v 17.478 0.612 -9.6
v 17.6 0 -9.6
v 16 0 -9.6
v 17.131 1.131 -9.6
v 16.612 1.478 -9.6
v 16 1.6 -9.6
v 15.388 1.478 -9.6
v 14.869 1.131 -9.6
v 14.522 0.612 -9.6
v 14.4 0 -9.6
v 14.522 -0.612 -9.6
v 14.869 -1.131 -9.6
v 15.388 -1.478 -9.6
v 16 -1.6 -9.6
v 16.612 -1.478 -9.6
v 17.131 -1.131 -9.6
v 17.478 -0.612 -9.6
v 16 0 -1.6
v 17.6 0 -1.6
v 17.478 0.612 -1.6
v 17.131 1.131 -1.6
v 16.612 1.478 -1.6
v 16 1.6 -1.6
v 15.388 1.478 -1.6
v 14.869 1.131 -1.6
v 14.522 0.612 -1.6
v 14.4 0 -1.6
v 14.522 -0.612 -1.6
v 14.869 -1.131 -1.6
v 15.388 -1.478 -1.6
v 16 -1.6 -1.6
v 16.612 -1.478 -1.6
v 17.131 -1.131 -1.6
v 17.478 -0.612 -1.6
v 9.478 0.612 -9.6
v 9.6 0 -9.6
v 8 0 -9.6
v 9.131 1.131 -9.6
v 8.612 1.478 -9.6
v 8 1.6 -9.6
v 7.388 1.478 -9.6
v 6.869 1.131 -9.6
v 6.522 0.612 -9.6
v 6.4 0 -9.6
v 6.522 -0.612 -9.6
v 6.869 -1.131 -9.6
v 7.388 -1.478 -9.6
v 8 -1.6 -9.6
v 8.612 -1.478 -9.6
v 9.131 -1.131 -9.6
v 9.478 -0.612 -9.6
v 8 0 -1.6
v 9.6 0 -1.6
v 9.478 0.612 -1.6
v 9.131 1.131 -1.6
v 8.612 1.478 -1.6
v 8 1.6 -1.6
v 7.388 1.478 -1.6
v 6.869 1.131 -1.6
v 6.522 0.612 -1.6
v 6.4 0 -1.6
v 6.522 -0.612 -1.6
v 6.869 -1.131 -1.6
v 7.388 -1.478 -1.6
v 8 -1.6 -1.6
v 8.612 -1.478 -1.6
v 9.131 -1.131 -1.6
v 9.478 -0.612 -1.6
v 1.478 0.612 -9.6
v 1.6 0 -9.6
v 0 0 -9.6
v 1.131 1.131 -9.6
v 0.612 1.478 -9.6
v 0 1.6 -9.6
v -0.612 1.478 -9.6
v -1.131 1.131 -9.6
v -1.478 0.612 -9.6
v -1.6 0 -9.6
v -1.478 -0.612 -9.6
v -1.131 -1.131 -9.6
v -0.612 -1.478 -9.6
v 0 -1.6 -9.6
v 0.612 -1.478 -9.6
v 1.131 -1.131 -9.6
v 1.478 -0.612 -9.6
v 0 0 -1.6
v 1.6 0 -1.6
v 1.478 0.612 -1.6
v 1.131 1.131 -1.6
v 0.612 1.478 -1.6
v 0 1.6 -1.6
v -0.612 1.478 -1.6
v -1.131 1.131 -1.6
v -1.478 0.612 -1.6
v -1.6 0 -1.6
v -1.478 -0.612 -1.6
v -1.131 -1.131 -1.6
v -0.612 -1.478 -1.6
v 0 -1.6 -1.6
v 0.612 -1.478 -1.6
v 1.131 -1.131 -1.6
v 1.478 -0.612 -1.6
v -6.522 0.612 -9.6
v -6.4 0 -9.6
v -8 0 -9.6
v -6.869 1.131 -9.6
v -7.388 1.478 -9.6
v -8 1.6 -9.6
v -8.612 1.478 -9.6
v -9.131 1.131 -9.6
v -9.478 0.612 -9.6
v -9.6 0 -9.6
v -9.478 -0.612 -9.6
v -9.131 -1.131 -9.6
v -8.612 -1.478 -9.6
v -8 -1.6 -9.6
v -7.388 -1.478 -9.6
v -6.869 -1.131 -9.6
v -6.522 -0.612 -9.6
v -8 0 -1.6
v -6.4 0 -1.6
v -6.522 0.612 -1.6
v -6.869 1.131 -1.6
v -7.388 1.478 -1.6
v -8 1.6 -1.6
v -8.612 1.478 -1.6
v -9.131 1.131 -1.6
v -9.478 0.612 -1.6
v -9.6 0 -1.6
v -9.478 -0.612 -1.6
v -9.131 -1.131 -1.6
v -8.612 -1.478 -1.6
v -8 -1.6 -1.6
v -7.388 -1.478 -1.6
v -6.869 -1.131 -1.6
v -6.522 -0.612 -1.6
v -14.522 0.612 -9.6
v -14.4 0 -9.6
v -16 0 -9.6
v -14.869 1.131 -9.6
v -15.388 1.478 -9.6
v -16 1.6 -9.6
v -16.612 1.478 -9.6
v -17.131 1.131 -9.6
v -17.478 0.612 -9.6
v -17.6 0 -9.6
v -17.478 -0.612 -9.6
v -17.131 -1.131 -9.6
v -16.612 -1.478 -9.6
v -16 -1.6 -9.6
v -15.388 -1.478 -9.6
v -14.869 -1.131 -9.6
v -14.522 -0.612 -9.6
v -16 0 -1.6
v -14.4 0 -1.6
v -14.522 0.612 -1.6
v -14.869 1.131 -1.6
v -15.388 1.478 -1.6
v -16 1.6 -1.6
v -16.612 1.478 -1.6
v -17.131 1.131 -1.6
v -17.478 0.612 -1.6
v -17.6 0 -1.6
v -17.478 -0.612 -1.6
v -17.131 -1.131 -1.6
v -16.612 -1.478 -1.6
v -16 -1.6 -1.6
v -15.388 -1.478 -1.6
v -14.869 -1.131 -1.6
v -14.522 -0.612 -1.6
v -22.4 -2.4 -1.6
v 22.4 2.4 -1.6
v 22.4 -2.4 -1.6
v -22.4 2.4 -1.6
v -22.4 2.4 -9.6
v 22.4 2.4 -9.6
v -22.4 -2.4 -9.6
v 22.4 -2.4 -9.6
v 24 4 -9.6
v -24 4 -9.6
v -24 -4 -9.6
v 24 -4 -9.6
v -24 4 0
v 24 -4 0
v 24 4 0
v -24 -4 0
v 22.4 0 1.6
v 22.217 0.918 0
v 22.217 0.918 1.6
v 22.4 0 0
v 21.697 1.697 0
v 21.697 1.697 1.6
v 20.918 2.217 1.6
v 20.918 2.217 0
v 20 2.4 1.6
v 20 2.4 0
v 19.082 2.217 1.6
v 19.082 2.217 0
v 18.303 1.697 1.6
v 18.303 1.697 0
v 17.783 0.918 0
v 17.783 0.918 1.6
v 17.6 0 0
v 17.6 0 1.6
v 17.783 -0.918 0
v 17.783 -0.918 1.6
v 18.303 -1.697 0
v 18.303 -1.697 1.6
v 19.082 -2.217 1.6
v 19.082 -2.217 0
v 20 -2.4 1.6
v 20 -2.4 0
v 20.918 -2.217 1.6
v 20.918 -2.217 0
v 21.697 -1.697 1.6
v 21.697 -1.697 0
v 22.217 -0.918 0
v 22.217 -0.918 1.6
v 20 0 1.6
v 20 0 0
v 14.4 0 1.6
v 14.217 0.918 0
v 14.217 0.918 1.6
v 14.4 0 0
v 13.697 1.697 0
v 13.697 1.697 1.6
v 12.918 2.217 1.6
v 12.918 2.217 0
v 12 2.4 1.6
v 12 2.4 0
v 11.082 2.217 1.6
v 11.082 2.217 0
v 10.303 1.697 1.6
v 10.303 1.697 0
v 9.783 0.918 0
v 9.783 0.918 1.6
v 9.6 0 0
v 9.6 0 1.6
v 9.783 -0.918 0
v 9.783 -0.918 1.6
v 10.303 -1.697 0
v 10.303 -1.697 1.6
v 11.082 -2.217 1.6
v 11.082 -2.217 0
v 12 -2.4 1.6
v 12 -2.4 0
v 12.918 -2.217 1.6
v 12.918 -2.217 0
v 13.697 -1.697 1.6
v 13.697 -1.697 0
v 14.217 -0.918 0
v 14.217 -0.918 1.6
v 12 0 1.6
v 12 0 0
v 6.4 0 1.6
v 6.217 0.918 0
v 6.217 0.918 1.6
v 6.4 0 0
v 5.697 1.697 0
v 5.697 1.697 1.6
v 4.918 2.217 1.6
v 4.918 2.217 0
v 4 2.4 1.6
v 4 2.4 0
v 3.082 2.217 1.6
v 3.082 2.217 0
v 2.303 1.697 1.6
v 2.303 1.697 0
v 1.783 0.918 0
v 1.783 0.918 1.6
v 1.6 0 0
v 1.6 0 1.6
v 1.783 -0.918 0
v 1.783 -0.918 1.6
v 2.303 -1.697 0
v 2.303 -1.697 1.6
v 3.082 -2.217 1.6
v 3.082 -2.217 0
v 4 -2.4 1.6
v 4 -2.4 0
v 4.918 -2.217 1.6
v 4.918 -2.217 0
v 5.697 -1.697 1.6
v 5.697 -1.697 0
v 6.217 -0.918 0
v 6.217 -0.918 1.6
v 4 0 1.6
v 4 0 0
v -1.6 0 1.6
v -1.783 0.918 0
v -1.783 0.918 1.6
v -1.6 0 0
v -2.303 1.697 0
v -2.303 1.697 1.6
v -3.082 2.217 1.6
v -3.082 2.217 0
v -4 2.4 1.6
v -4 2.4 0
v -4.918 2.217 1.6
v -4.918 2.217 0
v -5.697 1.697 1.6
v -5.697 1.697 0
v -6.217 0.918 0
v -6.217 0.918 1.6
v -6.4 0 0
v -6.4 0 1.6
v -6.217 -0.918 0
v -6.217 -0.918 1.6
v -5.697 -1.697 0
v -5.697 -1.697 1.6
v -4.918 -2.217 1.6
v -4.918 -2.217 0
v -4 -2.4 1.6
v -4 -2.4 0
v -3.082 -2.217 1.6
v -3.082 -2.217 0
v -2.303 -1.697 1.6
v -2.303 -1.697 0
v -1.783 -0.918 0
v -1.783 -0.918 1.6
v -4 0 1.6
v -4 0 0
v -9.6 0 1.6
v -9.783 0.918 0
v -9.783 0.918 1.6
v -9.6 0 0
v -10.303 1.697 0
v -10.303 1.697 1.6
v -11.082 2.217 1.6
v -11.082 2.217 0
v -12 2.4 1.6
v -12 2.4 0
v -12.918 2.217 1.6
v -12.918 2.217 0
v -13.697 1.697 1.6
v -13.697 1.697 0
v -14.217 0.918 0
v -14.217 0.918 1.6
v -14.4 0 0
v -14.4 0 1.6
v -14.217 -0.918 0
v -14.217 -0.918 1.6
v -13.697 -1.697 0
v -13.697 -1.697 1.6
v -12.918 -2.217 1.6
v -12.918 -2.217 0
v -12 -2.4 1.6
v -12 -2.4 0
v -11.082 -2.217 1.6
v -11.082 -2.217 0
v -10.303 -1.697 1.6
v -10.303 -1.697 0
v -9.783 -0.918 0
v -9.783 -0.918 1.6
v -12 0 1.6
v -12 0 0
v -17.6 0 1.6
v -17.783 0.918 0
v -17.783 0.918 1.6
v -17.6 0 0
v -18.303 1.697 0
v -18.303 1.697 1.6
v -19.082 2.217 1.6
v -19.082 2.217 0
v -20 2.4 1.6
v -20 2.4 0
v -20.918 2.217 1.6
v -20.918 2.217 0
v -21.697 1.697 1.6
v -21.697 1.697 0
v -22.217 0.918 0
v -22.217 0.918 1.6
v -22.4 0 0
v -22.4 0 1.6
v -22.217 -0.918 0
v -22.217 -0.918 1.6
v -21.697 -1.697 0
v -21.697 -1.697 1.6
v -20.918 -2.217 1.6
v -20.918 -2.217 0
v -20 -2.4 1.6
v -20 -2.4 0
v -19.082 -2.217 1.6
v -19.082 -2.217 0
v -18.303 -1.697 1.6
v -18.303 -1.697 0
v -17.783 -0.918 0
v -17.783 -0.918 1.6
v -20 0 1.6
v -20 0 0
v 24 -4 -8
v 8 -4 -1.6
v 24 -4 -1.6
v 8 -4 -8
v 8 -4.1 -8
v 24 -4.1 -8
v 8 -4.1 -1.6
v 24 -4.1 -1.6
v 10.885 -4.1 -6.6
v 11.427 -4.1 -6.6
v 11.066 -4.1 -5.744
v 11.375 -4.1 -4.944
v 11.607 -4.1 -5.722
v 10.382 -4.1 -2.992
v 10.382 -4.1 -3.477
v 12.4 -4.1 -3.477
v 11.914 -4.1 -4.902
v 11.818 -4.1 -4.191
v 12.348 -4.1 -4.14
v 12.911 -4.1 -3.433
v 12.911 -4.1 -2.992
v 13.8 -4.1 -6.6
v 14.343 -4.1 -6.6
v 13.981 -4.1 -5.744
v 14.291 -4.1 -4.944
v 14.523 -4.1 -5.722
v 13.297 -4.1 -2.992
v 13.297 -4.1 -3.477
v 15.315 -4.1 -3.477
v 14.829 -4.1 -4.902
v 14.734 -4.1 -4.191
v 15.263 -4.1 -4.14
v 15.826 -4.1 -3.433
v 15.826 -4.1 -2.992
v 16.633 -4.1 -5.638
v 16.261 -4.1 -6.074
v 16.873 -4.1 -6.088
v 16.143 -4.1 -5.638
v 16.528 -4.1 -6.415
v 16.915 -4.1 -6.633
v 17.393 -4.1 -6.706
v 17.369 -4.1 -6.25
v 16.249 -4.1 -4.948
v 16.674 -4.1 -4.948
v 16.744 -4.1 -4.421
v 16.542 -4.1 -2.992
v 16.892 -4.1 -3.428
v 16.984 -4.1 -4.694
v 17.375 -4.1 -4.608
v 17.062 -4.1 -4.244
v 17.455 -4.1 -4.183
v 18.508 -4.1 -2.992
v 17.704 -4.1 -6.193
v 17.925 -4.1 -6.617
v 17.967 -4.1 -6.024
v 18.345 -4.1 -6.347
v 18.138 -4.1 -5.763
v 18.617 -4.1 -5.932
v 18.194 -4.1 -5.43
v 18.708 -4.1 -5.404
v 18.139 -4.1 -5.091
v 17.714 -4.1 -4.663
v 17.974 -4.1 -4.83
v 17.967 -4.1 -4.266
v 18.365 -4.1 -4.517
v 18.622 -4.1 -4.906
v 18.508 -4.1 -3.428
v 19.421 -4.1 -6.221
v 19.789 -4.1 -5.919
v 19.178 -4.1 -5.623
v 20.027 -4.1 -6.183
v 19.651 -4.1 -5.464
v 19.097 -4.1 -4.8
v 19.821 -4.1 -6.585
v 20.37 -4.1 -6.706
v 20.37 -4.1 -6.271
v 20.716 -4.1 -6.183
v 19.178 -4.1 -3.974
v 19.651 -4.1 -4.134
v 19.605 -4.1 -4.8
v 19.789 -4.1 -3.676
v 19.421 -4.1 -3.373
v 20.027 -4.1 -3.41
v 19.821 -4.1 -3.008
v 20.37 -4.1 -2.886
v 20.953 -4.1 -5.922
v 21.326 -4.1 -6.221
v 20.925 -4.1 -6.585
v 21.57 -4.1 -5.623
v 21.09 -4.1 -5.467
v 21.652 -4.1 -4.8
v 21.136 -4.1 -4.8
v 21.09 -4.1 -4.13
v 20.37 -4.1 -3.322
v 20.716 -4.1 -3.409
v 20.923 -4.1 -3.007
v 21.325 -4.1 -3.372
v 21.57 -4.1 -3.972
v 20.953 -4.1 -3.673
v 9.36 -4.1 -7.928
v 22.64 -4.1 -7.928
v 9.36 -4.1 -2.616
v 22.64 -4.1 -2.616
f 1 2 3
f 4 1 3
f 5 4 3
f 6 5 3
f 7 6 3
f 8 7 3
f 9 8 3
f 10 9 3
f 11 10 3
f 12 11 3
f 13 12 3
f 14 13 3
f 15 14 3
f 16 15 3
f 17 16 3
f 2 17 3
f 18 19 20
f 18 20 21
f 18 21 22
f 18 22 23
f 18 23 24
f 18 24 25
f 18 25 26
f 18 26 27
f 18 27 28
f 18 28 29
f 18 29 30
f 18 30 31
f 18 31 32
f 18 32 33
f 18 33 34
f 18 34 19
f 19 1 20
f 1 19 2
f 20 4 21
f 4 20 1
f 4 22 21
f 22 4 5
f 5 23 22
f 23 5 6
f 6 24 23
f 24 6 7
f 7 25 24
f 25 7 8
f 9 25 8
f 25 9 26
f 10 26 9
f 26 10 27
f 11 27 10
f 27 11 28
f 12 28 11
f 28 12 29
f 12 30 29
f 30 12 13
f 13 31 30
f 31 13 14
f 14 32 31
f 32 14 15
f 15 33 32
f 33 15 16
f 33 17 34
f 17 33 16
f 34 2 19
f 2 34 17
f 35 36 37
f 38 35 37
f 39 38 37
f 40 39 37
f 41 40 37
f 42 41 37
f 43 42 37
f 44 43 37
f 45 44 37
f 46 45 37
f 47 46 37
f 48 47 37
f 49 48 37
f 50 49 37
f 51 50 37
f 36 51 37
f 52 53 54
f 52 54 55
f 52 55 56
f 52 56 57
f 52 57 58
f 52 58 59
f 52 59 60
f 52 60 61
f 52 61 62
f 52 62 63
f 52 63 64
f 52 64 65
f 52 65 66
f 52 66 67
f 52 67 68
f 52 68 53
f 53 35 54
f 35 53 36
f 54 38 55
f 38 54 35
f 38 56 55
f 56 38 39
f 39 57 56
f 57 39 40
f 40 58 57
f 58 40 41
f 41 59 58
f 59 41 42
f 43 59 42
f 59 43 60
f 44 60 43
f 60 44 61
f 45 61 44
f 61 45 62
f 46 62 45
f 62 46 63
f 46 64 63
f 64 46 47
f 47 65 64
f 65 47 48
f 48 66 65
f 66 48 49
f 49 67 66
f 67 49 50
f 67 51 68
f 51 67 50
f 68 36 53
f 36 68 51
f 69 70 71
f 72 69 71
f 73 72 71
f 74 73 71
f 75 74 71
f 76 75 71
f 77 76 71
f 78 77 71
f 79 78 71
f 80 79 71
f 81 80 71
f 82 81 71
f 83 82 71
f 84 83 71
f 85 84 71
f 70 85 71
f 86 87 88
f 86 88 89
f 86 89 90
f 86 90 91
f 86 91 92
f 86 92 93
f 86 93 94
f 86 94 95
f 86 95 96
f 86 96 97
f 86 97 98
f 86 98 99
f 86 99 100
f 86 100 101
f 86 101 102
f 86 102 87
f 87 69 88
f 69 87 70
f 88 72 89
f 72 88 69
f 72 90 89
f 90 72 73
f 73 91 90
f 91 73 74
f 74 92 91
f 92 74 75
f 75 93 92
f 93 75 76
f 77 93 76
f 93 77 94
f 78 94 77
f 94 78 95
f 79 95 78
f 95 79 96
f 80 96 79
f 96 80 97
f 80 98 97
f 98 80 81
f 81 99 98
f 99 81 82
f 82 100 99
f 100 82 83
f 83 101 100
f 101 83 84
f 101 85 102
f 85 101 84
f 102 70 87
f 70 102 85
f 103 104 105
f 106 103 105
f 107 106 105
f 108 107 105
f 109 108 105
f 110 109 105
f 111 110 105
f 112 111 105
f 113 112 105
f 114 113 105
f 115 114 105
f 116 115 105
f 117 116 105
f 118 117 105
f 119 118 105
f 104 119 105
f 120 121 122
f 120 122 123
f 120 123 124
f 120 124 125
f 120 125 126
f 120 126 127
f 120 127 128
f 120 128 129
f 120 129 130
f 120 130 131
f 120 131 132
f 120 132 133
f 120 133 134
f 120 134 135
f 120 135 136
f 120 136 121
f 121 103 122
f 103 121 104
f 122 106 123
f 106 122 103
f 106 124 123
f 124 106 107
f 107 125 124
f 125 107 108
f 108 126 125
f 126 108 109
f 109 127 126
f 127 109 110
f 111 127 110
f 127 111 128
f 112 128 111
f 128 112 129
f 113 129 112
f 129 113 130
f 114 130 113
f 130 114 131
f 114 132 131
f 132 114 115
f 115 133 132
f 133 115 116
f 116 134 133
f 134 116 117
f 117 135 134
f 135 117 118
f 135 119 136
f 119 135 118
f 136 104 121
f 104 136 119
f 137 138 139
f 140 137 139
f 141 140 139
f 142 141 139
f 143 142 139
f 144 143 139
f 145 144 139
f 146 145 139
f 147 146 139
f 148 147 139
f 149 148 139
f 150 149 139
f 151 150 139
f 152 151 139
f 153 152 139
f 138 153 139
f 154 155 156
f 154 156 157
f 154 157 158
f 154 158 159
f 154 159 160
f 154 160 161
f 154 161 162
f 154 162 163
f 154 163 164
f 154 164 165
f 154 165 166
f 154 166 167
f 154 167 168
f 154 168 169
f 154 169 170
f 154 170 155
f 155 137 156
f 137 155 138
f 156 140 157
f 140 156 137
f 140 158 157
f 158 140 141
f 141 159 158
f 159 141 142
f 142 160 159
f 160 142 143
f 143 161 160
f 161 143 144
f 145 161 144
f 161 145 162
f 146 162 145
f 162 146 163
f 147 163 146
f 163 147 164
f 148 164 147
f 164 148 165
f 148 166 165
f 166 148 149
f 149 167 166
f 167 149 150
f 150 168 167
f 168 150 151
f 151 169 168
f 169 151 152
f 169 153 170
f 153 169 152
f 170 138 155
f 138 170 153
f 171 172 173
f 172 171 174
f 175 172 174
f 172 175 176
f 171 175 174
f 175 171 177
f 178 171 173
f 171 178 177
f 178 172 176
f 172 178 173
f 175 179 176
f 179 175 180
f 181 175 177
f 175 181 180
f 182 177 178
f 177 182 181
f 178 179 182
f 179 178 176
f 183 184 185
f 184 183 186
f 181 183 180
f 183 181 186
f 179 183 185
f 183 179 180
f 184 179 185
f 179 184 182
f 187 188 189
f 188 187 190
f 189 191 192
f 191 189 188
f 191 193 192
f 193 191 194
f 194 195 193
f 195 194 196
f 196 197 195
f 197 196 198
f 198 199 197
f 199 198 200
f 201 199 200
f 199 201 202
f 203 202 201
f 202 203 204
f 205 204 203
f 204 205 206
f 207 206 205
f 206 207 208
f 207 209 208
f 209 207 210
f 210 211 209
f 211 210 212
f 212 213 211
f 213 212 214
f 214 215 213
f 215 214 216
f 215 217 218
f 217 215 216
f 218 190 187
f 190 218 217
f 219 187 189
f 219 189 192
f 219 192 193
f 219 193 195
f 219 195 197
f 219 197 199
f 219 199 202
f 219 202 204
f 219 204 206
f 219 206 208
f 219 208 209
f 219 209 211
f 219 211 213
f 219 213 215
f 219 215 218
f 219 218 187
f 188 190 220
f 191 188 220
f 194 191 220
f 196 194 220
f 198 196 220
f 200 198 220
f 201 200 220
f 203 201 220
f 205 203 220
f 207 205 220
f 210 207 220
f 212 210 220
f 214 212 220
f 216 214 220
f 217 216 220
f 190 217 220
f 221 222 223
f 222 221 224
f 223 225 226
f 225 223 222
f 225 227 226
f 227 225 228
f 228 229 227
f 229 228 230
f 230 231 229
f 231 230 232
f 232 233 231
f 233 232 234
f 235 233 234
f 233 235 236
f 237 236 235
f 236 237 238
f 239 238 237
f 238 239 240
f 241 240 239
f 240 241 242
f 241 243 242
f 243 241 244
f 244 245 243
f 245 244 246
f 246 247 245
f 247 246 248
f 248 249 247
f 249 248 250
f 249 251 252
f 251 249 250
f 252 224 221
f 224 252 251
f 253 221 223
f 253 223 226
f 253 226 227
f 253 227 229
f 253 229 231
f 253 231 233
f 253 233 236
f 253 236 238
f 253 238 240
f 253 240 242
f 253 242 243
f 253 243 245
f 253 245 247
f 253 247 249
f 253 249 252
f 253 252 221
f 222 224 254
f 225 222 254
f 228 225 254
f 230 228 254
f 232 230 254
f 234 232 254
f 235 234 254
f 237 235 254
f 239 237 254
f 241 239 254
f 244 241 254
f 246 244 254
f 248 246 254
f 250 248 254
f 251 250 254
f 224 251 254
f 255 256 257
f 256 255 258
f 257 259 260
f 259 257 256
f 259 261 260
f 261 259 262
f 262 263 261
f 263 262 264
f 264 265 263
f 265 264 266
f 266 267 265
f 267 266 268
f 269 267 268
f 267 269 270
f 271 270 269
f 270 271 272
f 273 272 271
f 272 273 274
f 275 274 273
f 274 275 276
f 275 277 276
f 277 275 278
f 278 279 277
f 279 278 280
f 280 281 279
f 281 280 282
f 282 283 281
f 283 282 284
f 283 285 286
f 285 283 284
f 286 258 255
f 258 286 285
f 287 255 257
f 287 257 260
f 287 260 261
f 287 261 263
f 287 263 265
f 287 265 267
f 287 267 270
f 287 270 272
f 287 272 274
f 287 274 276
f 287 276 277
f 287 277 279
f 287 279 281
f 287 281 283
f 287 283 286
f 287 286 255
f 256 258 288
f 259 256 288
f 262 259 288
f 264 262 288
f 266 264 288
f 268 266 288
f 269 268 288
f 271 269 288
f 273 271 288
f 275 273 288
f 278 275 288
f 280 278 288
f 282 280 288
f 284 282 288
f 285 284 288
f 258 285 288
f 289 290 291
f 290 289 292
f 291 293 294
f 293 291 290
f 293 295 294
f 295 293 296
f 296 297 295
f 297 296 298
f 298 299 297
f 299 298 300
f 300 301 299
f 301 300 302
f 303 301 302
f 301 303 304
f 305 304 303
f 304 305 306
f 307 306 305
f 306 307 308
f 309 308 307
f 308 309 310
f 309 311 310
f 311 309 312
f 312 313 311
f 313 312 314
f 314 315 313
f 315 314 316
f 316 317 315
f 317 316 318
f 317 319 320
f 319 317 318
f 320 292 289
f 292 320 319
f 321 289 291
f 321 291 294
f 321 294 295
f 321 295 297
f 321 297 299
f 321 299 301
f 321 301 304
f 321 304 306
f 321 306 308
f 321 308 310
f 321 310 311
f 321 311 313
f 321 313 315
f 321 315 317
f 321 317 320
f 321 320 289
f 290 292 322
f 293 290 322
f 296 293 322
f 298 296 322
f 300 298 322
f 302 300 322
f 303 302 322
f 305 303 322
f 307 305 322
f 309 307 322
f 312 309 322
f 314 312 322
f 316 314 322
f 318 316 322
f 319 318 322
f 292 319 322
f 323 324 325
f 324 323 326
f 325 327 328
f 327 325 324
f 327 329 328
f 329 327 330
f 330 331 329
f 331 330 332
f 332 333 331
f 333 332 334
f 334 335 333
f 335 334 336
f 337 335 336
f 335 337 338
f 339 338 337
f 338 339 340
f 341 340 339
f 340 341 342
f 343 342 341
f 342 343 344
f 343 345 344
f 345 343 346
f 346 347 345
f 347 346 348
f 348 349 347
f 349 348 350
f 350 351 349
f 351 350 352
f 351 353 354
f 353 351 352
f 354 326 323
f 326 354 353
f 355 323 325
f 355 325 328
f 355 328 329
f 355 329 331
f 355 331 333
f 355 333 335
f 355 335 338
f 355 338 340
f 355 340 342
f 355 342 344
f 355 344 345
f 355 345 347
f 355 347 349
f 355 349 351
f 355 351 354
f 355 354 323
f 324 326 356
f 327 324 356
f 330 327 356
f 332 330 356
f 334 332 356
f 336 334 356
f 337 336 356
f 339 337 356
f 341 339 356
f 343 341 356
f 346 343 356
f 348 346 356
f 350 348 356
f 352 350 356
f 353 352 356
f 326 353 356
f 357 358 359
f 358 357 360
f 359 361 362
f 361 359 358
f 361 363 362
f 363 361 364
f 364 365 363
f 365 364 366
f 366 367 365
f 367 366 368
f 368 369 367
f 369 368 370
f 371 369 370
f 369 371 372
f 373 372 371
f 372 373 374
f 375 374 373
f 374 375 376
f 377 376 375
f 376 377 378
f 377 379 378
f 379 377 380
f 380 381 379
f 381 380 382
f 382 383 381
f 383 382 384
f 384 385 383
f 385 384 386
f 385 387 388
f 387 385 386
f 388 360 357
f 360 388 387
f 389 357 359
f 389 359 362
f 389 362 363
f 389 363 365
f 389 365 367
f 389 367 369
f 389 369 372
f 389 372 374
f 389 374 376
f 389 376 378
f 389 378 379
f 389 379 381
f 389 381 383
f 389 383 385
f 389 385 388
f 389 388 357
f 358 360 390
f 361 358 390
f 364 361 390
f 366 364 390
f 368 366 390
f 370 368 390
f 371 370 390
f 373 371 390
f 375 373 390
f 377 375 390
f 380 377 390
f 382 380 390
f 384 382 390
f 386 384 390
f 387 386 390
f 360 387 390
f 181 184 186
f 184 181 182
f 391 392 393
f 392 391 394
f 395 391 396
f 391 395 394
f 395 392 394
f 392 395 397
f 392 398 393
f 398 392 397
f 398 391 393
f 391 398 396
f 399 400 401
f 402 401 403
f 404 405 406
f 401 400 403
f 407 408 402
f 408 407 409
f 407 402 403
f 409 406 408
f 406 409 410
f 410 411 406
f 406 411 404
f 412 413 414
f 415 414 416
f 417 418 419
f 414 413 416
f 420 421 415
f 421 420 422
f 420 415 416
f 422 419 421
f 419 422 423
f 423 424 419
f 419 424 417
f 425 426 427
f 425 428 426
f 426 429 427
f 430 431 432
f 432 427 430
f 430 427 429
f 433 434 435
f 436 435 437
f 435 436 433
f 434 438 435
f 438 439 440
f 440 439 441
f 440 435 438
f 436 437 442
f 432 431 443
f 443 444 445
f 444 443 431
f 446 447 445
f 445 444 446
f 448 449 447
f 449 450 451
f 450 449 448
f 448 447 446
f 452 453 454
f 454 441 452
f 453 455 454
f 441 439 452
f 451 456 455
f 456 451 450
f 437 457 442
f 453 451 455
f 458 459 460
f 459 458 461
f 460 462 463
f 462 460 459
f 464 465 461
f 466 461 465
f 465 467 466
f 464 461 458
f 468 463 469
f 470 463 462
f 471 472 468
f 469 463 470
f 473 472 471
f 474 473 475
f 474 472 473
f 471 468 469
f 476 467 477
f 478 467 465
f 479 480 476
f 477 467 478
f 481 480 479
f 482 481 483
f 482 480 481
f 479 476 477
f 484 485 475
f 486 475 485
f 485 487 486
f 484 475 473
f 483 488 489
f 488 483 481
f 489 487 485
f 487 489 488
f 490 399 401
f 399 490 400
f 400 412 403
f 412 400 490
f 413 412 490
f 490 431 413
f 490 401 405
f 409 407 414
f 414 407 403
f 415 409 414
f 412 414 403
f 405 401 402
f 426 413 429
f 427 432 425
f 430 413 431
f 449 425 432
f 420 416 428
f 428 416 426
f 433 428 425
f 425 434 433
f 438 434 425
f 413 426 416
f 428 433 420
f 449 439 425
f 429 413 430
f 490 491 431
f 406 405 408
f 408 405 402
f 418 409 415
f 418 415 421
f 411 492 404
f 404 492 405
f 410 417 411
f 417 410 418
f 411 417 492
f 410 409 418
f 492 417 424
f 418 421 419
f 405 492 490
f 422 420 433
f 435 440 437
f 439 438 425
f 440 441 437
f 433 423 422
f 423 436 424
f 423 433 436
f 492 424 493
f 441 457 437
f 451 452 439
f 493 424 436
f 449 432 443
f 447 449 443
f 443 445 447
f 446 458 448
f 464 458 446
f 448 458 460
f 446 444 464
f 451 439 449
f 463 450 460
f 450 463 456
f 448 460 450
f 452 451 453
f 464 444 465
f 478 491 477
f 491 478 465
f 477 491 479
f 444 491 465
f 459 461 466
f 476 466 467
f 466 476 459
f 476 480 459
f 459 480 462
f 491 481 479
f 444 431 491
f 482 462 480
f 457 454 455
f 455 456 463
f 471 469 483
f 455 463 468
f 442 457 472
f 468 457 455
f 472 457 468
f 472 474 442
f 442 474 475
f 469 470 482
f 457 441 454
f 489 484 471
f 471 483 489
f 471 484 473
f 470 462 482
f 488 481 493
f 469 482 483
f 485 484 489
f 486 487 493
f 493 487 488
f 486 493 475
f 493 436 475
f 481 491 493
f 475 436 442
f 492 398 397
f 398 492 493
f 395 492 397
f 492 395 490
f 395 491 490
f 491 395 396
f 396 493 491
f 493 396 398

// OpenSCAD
// file: ../p/4-4edge.scad
use <../lib.scad>
function ldraw_lib__4_4edge() = [
// 0 Circle 1.0
// 0 Name: 4-4edge.dat
// 0 Author: James Jessiman
// 0 !LDRAW_ORG Primitive UPDATE 2017-01
// 0 !LICENSE Licensed under CC BY 2.0 and CC BY 4.0 : see CAreadme.txt
// 
// 0 BFC CERTIFY CCW
  [0,"BFC","CERTIFY"],
  [0,"BFC","CCW"],
// 
// 0 !HISTORY 1998-12-15 [PTadmin] Official Update 1998-10
// 0 !HISTORY 2005-12-28 [PTadmin] Official Update 2005-01
// 0 !HISTORY 2007-06-24 [PTadmin] Header formatted for Contributor Agreement
// 0 !HISTORY 2008-07-01 [PTadmin] Official Update 2008-01
// 0 !HISTORY 2017-01-15 [Steffen] BFCed
// 0 !HISTORY 2017-12-30 [PTadmin] Official Update 2017-01
// 
// 
// 2 24 1 0 0 0.9239 0 0.3827
  [2,24,1,0,0,0.9239,0,0.3827],
// 2 24 0.9239 0 0.3827 0.7071 0 0.7071
  [2,24,0.9239,0,0.3827,0.7071,0,0.7071],
// 2 24 0.7071 0 0.7071 0.3827 0 0.9239
  [2,24,0.7071,0,0.7071,0.3827,0,0.9239],
// 2 24 0.3827 0 0.9239 0 0 1
  [2,24,0.3827,0,0.9239,0,0,1],
// 2 24 0 0 1 -0.3827 0 0.9239
  [2,24,0,0,1,-0.3827,0,0.9239],
// 2 24 -0.3827 0 0.9239 -0.7071 0 0.7071
  [2,24,-0.3827,0,0.9239,-0.7071,0,0.7071],
// 2 24 -0.7071 0 0.7071 -0.9239 0 0.3827
  [2,24,-0.7071,0,0.7071,-0.9239,0,0.3827],
// 2 24 -0.9239 0 0.3827 -1 0 -0
  [2,24,-0.9239,0,0.3827,-1,0,-0],
// 2 24 -1 0 -0 -0.9239 0 -0.3827
  [2,24,-1,0,-0,-0.9239,0,-0.3827],
// 2 24 -0.9239 0 -0.3827 -0.7071 0 -0.7071
  [2,24,-0.9239,0,-0.3827,-0.7071,0,-0.7071],
// 2 24 -0.7071 0 -0.7071 -0.3827 0 -0.9239
  [2,24,-0.7071,0,-0.7071,-0.3827,0,-0.9239],
// 2 24 -0.3827 0 -0.9239 0 0 -1
  [2,24,-0.3827,0,-0.9239,0,0,-1],
// 2 24 0 0 -1 0.3827 0 -0.9239
  [2,24,0,0,-1,0.3827,0,-0.9239],
// 2 24 0.3827 0 -0.9239 0.7071 0 -0.7071
  [2,24,0.3827,0,-0.9239,0.7071,0,-0.7071],
// 2 24 0.7071 0 -0.7071 0.9239 0 -0.3827
  [2,24,0.7071,0,-0.7071,0.9239,0,-0.3827],
// 2 24 0.9239 0 -0.3827 1 0 0
  [2,24,0.9239,0,-0.3827,1,0,0],
];
module ldraw_lib__4_4edge(step=0, col=false, unit=2/5, alt=false, line=0.2, solid=!$preview)
    makepoly(ldraw_lib__4_4edge(), step=step, col=col, unit=unit, alt=alt, line=line, solid=solid);
ldraw_lib__4_4edge(line=0.2);
// file: ../p/4-4disc.scad
use <../lib.scad>
function ldraw_lib__4_4disc() = [
// 0 Disc 1.0
// 0 Name: 4-4disc.dat
// 0 Author: James Jessiman
// 0 !LDRAW_ORG Primitive UPDATE 2002-02
// 0 !LICENSE Licensed under CC BY 2.0 and CC BY 4.0 : see CAreadme.txt
// 
// 0 BFC CERTIFY CCW
  [0,"BFC","CERTIFY"],
  [0,"BFC","CCW"],
// 
// 0 !HISTORY 1998-12-15 [PTadmin] Official Update 1998-10
// 0 !HISTORY 2002-03-23 [sbliss] Added BFC statement
// 0 !HISTORY 2002-04-25 [PTadmin] Official Update 2002-02
// 0 !HISTORY 2007-06-24 [PTadmin] Header formatted for Contributor Agreement
// 0 !HISTORY 2008-07-01 [PTadmin] Official Update 2008-01
// 
// 
// 3 16 0 0 0 1 0 0 0.9239 0 0.3827
  [3,16,0,0,0,1,0,0,0.9239,0,0.3827],
// 3 16 0 0 0 0.9239 0 0.3827 0.7071 0 0.7071
  [3,16,0,0,0,0.9239,0,0.3827,0.7071,0,0.7071],
// 3 16 0 0 0 0.7071 0 0.7071 0.3827 0 0.9239
  [3,16,0,0,0,0.7071,0,0.7071,0.3827,0,0.9239],
// 3 16 0 0 0 0.3827 0 0.9239 0 0 1
  [3,16,0,0,0,0.3827,0,0.9239,0,0,1],
// 3 16 0 0 0 0 0 1 -0.3827 0 0.9239
  [3,16,0,0,0,0,0,1,-0.3827,0,0.9239],
// 3 16 0 0 0 -0.3827 0 0.9239 -0.7071 0 0.7071
  [3,16,0,0,0,-0.3827,0,0.9239,-0.7071,0,0.7071],
// 3 16 0 0 0 -0.7071 0 0.7071 -0.9239 0 0.3827
  [3,16,0,0,0,-0.7071,0,0.7071,-0.9239,0,0.3827],
// 3 16 0 0 0 -0.9239 0 0.3827 -1 0 -0
  [3,16,0,0,0,-0.9239,0,0.3827,-1,0,-0],
// 3 16 0 0 0 -1 0 -0 -0.9239 0 -0.3827
  [3,16,0,0,0,-1,0,-0,-0.9239,0,-0.3827],
// 3 16 0 0 0 -0.9239 0 -0.3827 -0.7071 0 -0.7071
  [3,16,0,0,0,-0.9239,0,-0.3827,-0.7071,0,-0.7071],
// 3 16 0 0 0 -0.7071 0 -0.7071 -0.3827 0 -0.9239
  [3,16,0,0,0,-0.7071,0,-0.7071,-0.3827,0,-0.9239],
// 3 16 0 0 0 -0.3827 0 -0.9239 0 0 -1
  [3,16,0,0,0,-0.3827,0,-0.9239,0,0,-1],
// 3 16 0 0 0 0 0 -1 0.3827 0 -0.9239
  [3,16,0,0,0,0,0,-1,0.3827,0,-0.9239],
// 3 16 0 0 0 0.3827 0 -0.9239 0.7071 0 -0.7071
  [3,16,0,0,0,0.3827,0,-0.9239,0.7071,0,-0.7071],
// 3 16 0 0 0 0.7071 0 -0.7071 0.9239 0 -0.3827
  [3,16,0,0,0,0.7071,0,-0.7071,0.9239,0,-0.3827],
// 3 16 0 0 0 0.9239 0 -0.3827 1 0 0
  [3,16,0,0,0,0.9239,0,-0.3827,1,0,0],
// 0
];
module ldraw_lib__4_4disc(step=0, col=false, unit=2/5, alt=false, line=0.2, solid=!$preview)
    makepoly(ldraw_lib__4_4disc(), step=step, col=col, unit=unit, alt=alt, line=line, solid=solid);
ldraw_lib__4_4disc(line=0.2);
// file: ../p/4-4cyli.scad
use <../lib.scad>
$fa=1; $fs=0.2;
function ldraw_lib__4_4cyli(realsolid=false) = [
// 0 Cylinder 1.0
// 0 Name: 4-4cyli.dat
// 0 Author: James Jessiman
// 0 !LDRAW_ORG Primitive UPDATE 2005-01
// 0 !LICENSE Licensed under CC BY 2.0 and CC BY 4.0 : see CAreadme.txt
// 
// 0 BFC CERTIFY CCW
  [0,"BFC","CERTIFY"],
  [0,"BFC","CCW"],
// 
// 0 !HISTORY 1998-12-15 [PTadmin] Official Update 1998-10
// 0 !HISTORY 2002-03-23 [sbliss] Added BFC statement; merged headers from files in distributions LDraw 0.27 and Complete.
// 0 !HISTORY 2002-04-25 [PTadmin] Official Update 2002-02
// 0 !HISTORY 2004-12-14 [guyvivan] BFC CCW
// 0 !HISTORY 2005-12-28 [PTadmin] Official Update 2005-01
// 0 !HISTORY 2007-06-24 [PTadmin] Header formatted for Contributor Agreement
// 0 !HISTORY 2008-07-01 [PTadmin] Official Update 2008-01
// 
// 
// 4 16 1 1 0 0.9239 1 0.3827 0.9239 0 0.3827 1 0 0
  [4,16,1,1,0,0.9239,1,0.3827,0.9239,0,0.3827,1,0,0],
// 5 24 1 0 0 1 1 0 0.9239 0 0.3827 0.9239 0 -0.3827
  [5,24,1,0,0,1,1,0,0.9239,0,0.3827,0.9239,0,-0.3827],
// 4 16 0.9239 1 0.3827 0.7071 1 0.7071 0.7071 0 0.7071 0.9239 0 0.3827
  [4,16,0.9239,1,0.3827,0.7071,1,0.7071,0.7071,0,0.7071,0.9239,0,0.3827],
// 5 24 0.9239 0 0.3827 0.9239 1 0.3827 0.7071 0 0.7071 1 0 0
  [5,24,0.9239,0,0.3827,0.9239,1,0.3827,0.7071,0,0.7071,1,0,0],
// 4 16 0.7071 1 0.7071 0.3827 1 0.9239 0.3827 0 0.9239 0.7071 0 0.7071
  [4,16,0.7071,1,0.7071,0.3827,1,0.9239,0.3827,0,0.9239,0.7071,0,0.7071],
// 5 24 0.7071 0 0.7071 0.7071 1 0.7071 0.3827 0 0.9239 0.9239 0 0.3827
  [5,24,0.7071,0,0.7071,0.7071,1,0.7071,0.3827,0,0.9239,0.9239,0,0.3827],
// 4 16 0.3827 1 0.9239 0 1 1 0 0 1 0.3827 0 0.9239
  [4,16,0.3827,1,0.9239,0,1,1,0,0,1,0.3827,0,0.9239],
// 5 24 0.3827 0 0.9239 0.3827 1 0.9239 0 0 1 0.7071 0 0.7071
  [5,24,0.3827,0,0.9239,0.3827,1,0.9239,0,0,1,0.7071,0,0.7071],
// 4 16 0 1 1 -0.3827 1 0.9239 -0.3827 0 0.9239 0 0 1
  [4,16,0,1,1,-0.3827,1,0.9239,-0.3827,0,0.9239,0,0,1],
// 5 24 0 0 1 0 1 1 -0.3827 0 0.9239 0.3827 0 0.9239
  [5,24,0,0,1,0,1,1,-0.3827,0,0.9239,0.3827,0,0.9239],
// 4 16 -0.3827 1 0.9239 -0.7071 1 0.7071 -0.7071 0 0.7071 -0.3827 0 0.9239
  [4,16,-0.3827,1,0.9239,-0.7071,1,0.7071,-0.7071,0,0.7071,-0.3827,0,0.9239],
// 5 24 -0.3827 0 0.9239 -0.3827 1 0.9239 -0.7071 0 0.7071 0 0 1
  [5,24,-0.3827,0,0.9239,-0.3827,1,0.9239,-0.7071,0,0.7071,0,0,1],
// 4 16 -0.7071 1 0.7071 -0.9239 1 0.3827 -0.9239 0 0.3827 -0.7071 0 0.7071
  [4,16,-0.7071,1,0.7071,-0.9239,1,0.3827,-0.9239,0,0.3827,-0.7071,0,0.7071],
// 5 24 -0.7071 0 0.7071 -0.7071 1 0.7071 -0.9239 0 0.3827 -0.3827 0 0.9239
  [5,24,-0.7071,0,0.7071,-0.7071,1,0.7071,-0.9239,0,0.3827,-0.3827,0,0.9239],
// 4 16 -0.9239 1 0.3827 -1 1 0 -1 0 0 -0.9239 0 0.3827
  [4,16,-0.9239,1,0.3827,-1,1,0,-1,0,0,-0.9239,0,0.3827],
// 5 24 -0.9239 0 0.3827 -0.9239 1 0.3827 -1 0 0 -0.7071 0 0.7071
  [5,24,-0.9239,0,0.3827,-0.9239,1,0.3827,-1,0,0,-0.7071,0,0.7071],
// 4 16 -1 1 0 -0.9239 1 -0.3827 -0.9239 0 -0.3827 -1 0 0
  [4,16,-1,1,0,-0.9239,1,-0.3827,-0.9239,0,-0.3827,-1,0,0],
// 5 24 -1 0 0 -1 1 0 -0.9239 0 -0.3827 -0.9239 0 0.3827
  [5,24,-1,0,0,-1,1,0,-0.9239,0,-0.3827,-0.9239,0,0.3827],
// 4 16 -0.9239 1 -0.3827 -0.7071 1 -0.7071 -0.7071 0 -0.7071 -0.9239 0 -0.3827
  [4,16,-0.9239,1,-0.3827,-0.7071,1,-0.7071,-0.7071,0,-0.7071,-0.9239,0,-0.3827],
// 5 24 -0.9239 0 -0.3827 -0.9239 1 -0.3827 -0.7071 0 -0.7071 -1 0 0
  [5,24,-0.9239,0,-0.3827,-0.9239,1,-0.3827,-0.7071,0,-0.7071,-1,0,0],
// 4 16 -0.7071 1 -0.7071 -0.3827 1 -0.9239 -0.3827 0 -0.9239 -0.7071 0 -0.7071
  [4,16,-0.7071,1,-0.7071,-0.3827,1,-0.9239,-0.3827,0,-0.9239,-0.7071,0,-0.7071],
// 5 24 -0.7071 0 -0.7071 -0.7071 1 -0.7071 -0.3827 0 -0.9239 -0.9239 0 -0.3827
  [5,24,-0.7071,0,-0.7071,-0.7071,1,-0.7071,-0.3827,0,-0.9239,-0.9239,0,-0.3827],
// 4 16 -0.3827 1 -0.9239 0 1 -1 0 0 -1 -0.3827 0 -0.9239
  [4,16,-0.3827,1,-0.9239,0,1,-1,0,0,-1,-0.3827,0,-0.9239],
// 5 24 -0.3827 0 -0.9239 -0.3827 1 -0.9239 0 0 -1 -0.7071 0 -0.7071
  [5,24,-0.3827,0,-0.9239,-0.3827,1,-0.9239,0,0,-1,-0.7071,0,-0.7071],
// 4 16 0 1 -1 0.3827 1 -0.9239 0.3827 0 -0.9239 0 0 -1
  [4,16,0,1,-1,0.3827,1,-0.9239,0.3827,0,-0.9239,0,0,-1],
// 5 24 0 0 -1 0 1 -1 0.3827 0 -0.9239 -0.3827 0 -0.9239
  [5,24,0,0,-1,0,1,-1,0.3827,0,-0.9239,-0.3827,0,-0.9239],
// 4 16 0.3827 1 -0.9239 0.7071 1 -0.7071 0.7071 0 -0.7071 0.3827 0 -0.9239
  [4,16,0.3827,1,-0.9239,0.7071,1,-0.7071,0.7071,0,-0.7071,0.3827,0,-0.9239],
// 5 24 0.3827 0 -0.9239 0.3827 1 -0.9239 0.7071 0 -0.7071 0 0 -1
  [5,24,0.3827,0,-0.9239,0.3827,1,-0.9239,0.7071,0,-0.7071,0,0,-1],
// 4 16 0.7071 1 -0.7071 0.9239 1 -0.3827 0.9239 0 -0.3827 0.7071 0 -0.7071
  [4,16,0.7071,1,-0.7071,0.9239,1,-0.3827,0.9239,0,-0.3827,0.7071,0,-0.7071],
// 5 24 0.7071 0 -0.7071 0.7071 1 -0.7071 0.9239 0 -0.3827 0.3827 0 -0.9239
  [5,24,0.7071,0,-0.7071,0.7071,1,-0.7071,0.9239,0,-0.3827,0.3827,0,-0.9239],
// 4 16 0.9239 1 -0.3827 1 1 0 1 0 0 0.9239 0 -0.3827
  [4,16,0.9239,1,-0.3827,1,1,0,1,0,0,0.9239,0,-0.3827],
// 5 24 0.9239 0 -0.3827 0.9239 1 -0.3827 1 0 0 0.7071 0 -0.7071
  [5,24,0.9239,0,-0.3827,0.9239,1,-0.3827,1,0,0,0.7071,0,-0.7071],
// 0
];
module ldraw_lib__4_4cyli(step=0, col=false, unit=2/5, alt=false, line=0.2, solid=!$preview)
    makepoly(ldraw_lib__4_4cyli(solid), step=step, col=col, unit=unit, alt=alt, line=line, solid=solid);
ldraw_lib__4_4cyli(line=0.2);
// file: ../p/stud3.scad
use <../lib.scad>
use <4-4cyli.scad>
use <4-4disc.scad>
use <4-4edge.scad>
function ldraw_lib__stud3() = [
// 0 Stud Tube Solid
// 0 Name: stud3.dat
// 0 Author: James Jessiman
// 0 !LDRAW_ORG Primitive UPDATE 2012-01
// 0 !LICENSE Licensed under CC BY 4.0 : see CAreadme.txt
// 
// 0 BFC CERTIFY CCW
  [0,"BFC","CERTIFY"],
  [0,"BFC","CCW"],
// 
// 0 !HISTORY 2002-04-04 [sbliss] Modified for BFC compliance
// 0 !HISTORY 2002-04-25 [PTadmin] Official Update 2002-02
// 0 !HISTORY 2007-06-24 [PTadmin] Header formatted for Contributor Agreement
// 0 !HISTORY 2008-07-01 [PTadmin] Official Update 2008-01
// 0 !HISTORY 2012-02-16 [Philo] Changed to CCW
// 0 !HISTORY 2012-03-30 [PTadmin] Official Update 2012-01
// 
// 
// 1 16 0 -4 0 4 0 0 0 1 0 0 0 4 4-4edge.dat
  [1,16,0,-4,0,4,0,0,0,1,0,0,0,4, ldraw_lib__4_4edge()],
// 1 16 0 0 0 4 0 0 0 1 0 0 0 4 4-4edge.dat
  [1,16,0,0,0,4,0,0,0,1,0,0,0,4, ldraw_lib__4_4edge()],
// 1 16 0 -4 0 4 0 0 0 1 0 0 0 4 4-4disc.dat
  [1,16,0,-4,0,4,0,0,0,1,0,0,0,4, ldraw_lib__4_4disc()],
  [-1,16,0,0,0,4,0,0,0,-1,0,0,0,4, ldraw_lib__4_4disc()],
// 1 16 0 -4 0 4 0 0 0 4 0 0 0 4 4-4cyli.dat
  [1,16,0,-4,0,4,0,0,0,4,0,0,0,4, ldraw_lib__4_4cyli()],
];
module ldraw_lib__stud3(step=0, col=false, unit=2/5, alt=false, line=0.2, solid=!$preview)
    makepoly(ldraw_lib__stud3(), step=step, col=col, unit=unit, alt=alt, line=line, solid=solid);
ldraw_lib__stud3(line=0.2);
// file: ../p/stud.scad
use <../lib.scad>
use <4-4cyli.scad>
use <4-4disc.scad>
use <4-4edge.scad>
function ldraw_lib__stud() = [
// 0 Stud
// 0 Name: stud.dat
// 0 Author: James Jessiman
// 0 !LDRAW_ORG Primitive UPDATE 2012-01
// 0 !LICENSE Licensed under CC BY 4.0 : see CAreadme.txt
// 
// 0 BFC CERTIFY CCW
  [0,"BFC","CERTIFY"],
  [0,"BFC","CCW"],
// 
// 0 !HISTORY 2002-04-04 [sbliss] Modified for BFC compliance
// 0 !HISTORY 2002-04-25 [PTadmin] Official Update 2002-02
// 0 !HISTORY 2007-06-24 [PTadmin] Header formatted for Contributor Agreement
// 0 !HISTORY 2008-07-01 [PTadmin] Official Update 2008-01
// 0 !HISTORY 2012-02-16 [Philo] Changed to CCW
// 0 !HISTORY 2012-03-30 [PTadmin] Official Update 2012-01
// 
// 
// 1 16 0 0 0 6 0 0 0 1 0 0 0 6 4-4edge.dat
  [1,16,0,0,0,6,0,0,0,1,0,0,0,6, ldraw_lib__4_4edge()],
// 1 16 0 -4 0 6 0 0 0 1 0 0 0 6 4-4edge.dat
  [1,16,0,-4,0,6,0,0,0,1,0,0,0,6, ldraw_lib__4_4edge()],
// 1 16 0 0 0 6 0 0 0 -4 0 0 0 6 4-4cyli.dat
  [1,16,0,0,0,6,0,0,0,-4,0,0,0,6, ldraw_lib__4_4cyli()],
// 1 16 0 -4 0 6 0 0 0 1 0 0 0 6 4-4disc.dat
  [1,16,0,-4,0,6,0,0,0,1,0,0,0,6, ldraw_lib__4_4disc()],
  [-1,16,0,0,0,6,0,0,0,-1,0,0,0,6, ldraw_lib__4_4disc()],
];
module ldraw_lib__stud(step=0, col=false, unit=2/5, alt=false, line=0.2, solid=!$preview)
    makepoly(ldraw_lib__stud(), step=step, col=col, unit=unit, alt=alt, line=line, solid=solid);
ldraw_lib__stud(line=0.2);
// file: ../p/box5.scad
use <../lib.scad>
function ldraw_lib__box5() = [
// 0 Box with 5 Faces and All Edges
// 0 Name: box5.dat
// 0 Author: James Jessiman
// 0 !LDRAW_ORG Primitive UPDATE 2012-01
// 0 !LICENSE Licensed under CC BY 2.0 and CC BY 4.0 : see CAreadme.txt
// 
// 0 BFC CERTIFY CCW
  [0,"BFC","CERTIFY"],
  [0,"BFC","CCW"],
// 
// 0 !HISTORY 2002-04-03 [sbliss] Modified for BFC compliance
// 0 !HISTORY 2002-04-25 [PTadmin] Official Update 2002-02
// 0 !HISTORY 2007-06-24 [PTadmin] Header formatted for Contributor Agreement
// 0 !HISTORY 2008-07-01 [PTadmin] Official Update 2008-01
// 0 !HISTORY 2012-02-16 [Philo] Changed to CCW
// 0 !HISTORY 2012-03-30 [PTadmin] Official Update 2012-01
// 
// 
// 2 24 1 1 1 -1 1 1
  [2,24,1,1,1,-1,1,1],
// 2 24 -1 1 1 -1 1 -1
  [2,24,-1,1,1,-1,1,-1],
// 2 24 -1 1 -1 1 1 -1
  [2,24,-1,1,-1,1,1,-1],
// 2 24 1 1 -1 1 1 1
  [2,24,1,1,-1,1,1,1],
// 2 24 1 0 1 -1 0 1
  [2,24,1,0,1,-1,0,1],
// 2 24 -1 0 1 -1 0 -1
  [2,24,-1,0,1,-1,0,-1],
// 2 24 -1 0 -1 1 0 -1
  [2,24,-1,0,-1,1,0,-1],
// 2 24 1 0 -1 1 0 1
  [2,24,1,0,-1,1,0,1],
// 2 24 1 0 1 1 1 1
  [2,24,1,0,1,1,1,1],
// 2 24 -1 0 1 -1 1 1
  [2,24,-1,0,1,-1,1,1],
// 2 24 1 0 -1 1 1 -1
  [2,24,1,0,-1,1,1,-1],
// 2 24 -1 0 -1 -1 1 -1
  [2,24,-1,0,-1,-1,1,-1],
// 4 16 -1 1 1 1 1 1 1 1 -1 -1 1 -1
  [4,16,-1,1,1,1,1,1,1,1,-1,-1,1,-1],
// 4 16 -1 1 1 -1 0 1 1 0 1 1 1 1
  [4,16,-1,1,1,-1,0,1,1,0,1,1,1,1],
// 4 16 -1 1 -1 -1 0 -1 -1 0 1 -1 1 1
  [4,16,-1,1,-1,-1,0,-1,-1,0,1,-1,1,1],
// 4 16 1 1 -1 1 0 -1 -1 0 -1 -1 1 -1
  [4,16,1,1,-1,1,0,-1,-1,0,-1,-1,1,-1],
// 4 16 1 1 1 1 0 1 1 0 -1 1 1 -1
  [4,16,1,1,1,1,0,1,1,0,-1,1,1,-1],
];
makepoly(ldraw_lib__box5(), line=0.2);
// file: s/3009s01.scad
use <../../lib.scad>
use <../../p/box5.scad>
use <../../p/stud.scad>
use <../../p/stud3.scad>
$fa=1; $fs=0.2;
function ldraw_lib__s__3009s01(realsolid=false) = [
// 0 ~Brick  1 x  6 without Front Face
// 0 Name: s\3009s01.dat
// 0 Author: James Jessiman
// 0 !LDRAW_ORG Subpart UPDATE 2003-03
// 0 !LICENSE Licensed under CC BY 2.0 and CC BY 4.0 : see CAreadme.txt
// 
// 0 BFC CERTIFY CCW
  [0,"BFC","CERTIFY"],
  [0,"BFC","CCW"],
// 
// 0 !HISTORY 2002-05-07 {unknown} BFC Certification
// 0 !HISTORY 2003-07-03 [Steffen] Subfiled for patterning
// 0 !HISTORY 2003-12-19 [PTadmin] Official Update 2003-03
// 0 !HISTORY 2007-08-29 [PTadmin] Header formatted for Contributor Agreement
// 0 !HISTORY 2008-07-01 [PTadmin] Official Update 2008-01
// 
// 
// 1 16 40 4 0 1 0 0 0 -5 0 0 0 1 stud3.dat
  [1,16,40,4,0,1,0,0,0,-5,0,0,0,1, ldraw_lib__stud3(realsolid)],
// 1 16 20 4 0 1 0 0 0 -5 0 0 0 1 stud3.dat
  [1,16,20,4,0,1,0,0,0,-5,0,0,0,1, ldraw_lib__stud3(realsolid)],
// 1 16 0 4 0 1 0 0 0 -5 0 0 0 1 stud3.dat
  [1,16,0,4,0,1,0,0,0,-5,0,0,0,1, ldraw_lib__stud3(realsolid)],
// 1 16 -20 4 0 1 0 0 0 -5 0 0 0 1 stud3.dat
  [1,16,-20,4,0,1,0,0,0,-5,0,0,0,1, ldraw_lib__stud3(realsolid)],
// 1 16 -40 4 0 1 0 0 0 -5 0 0 0 1 stud3.dat
  [1,16,-40,4,0,1,0,0,0,-5,0,0,0,1, ldraw_lib__stud3(realsolid)],
// 0 BFC INVERTNEXT
  [0,"BFC","INVERTNEXT"],
// 1 16 0 24 0 56 0 0 0 -20 0 0 0 6 box5.dat
  [1,16,0,24,0,56,0,0,0,-20,0,0,0,6, ldraw_lib__box5(realsolid)],
// 4 16 60 24 10 56 24 6 -56 24 6 -60 24 10
  [4,16,60,24,10,56,24,6,-56,24,6,-60,24,10],
// 4 16 -60 24 10 -56 24 6 -56 24 -6 -60 24 -10
  [4,16,-60,24,10,-56,24,6,-56,24,-6,-60,24,-10],
// 4 16 -60 24 -10 -56 24 -6 56 24 -6 60 24 -10
  [4,16,-60,24,-10,-56,24,-6,56,24,-6,60,24,-10],
// 4 16 60 24 -10 56 24 -6 56 24 6 60 24 10
  [4,16,60,24,-10,56,24,-6,56,24,6,60,24,10],
// 2 24 60 0 10 -60 0 10
  [2,24,60,0,10,-60,0,10],
// 2 24 -60 0 10 -60 0 -10
  [2,24,-60,0,10,-60,0,-10],
// 2 24 -60 0 -10 60 0 -10
  [2,24,-60,0,-10,60,0,-10],
// 2 24 60 0 -10 60 0 10
  [2,24,60,0,-10,60,0,10],
// 2 24 60 24 10 -60 24 10
  [2,24,60,24,10,-60,24,10],
// 2 24 -60 24 10 -60 24 -10
  [2,24,-60,24,10,-60,24,-10],
// 2 24 -60 24 -10 60 24 -10
  [2,24,-60,24,-10,60,24,-10],
// 2 24 60 24 -10 60 24 10
  [2,24,60,24,-10,60,24,10],
// 2 24 60 24 10 60 0 10
  [2,24,60,24,10,60,0,10],
// 2 24 -60 24 10 -60 0 10
  [2,24,-60,24,10,-60,0,10],
// 2 24 60 24 -10 60 0 -10
  [2,24,60,24,-10,60,0,-10],
// 2 24 -60 24 -10 -60 0 -10
  [2,24,-60,24,-10,-60,0,-10],
// 4 16 -60 0 -10 60 0 -10 60 0 10 -60 0 10
  [4,16,-60,0,-10,60,0,-10,60,0,10,-60,0,10],
// 4 16 -60 0 10 -60 24 10 -60 24 -10 -60 0 -10
  [4,16,-60,0,10,-60,24,10,-60,24,-10,-60,0,-10],
// 4 16 60 0 10 60 24 10 -60 24 10 -60 0 10
  [4,16,60,0,10,60,24,10,-60,24,10,-60,0,10],
// 4 16 60 0 -10 60 24 -10 60 24 10 60 0 10
  [4,16,60,0,-10,60,24,-10,60,24,10,60,0,10],
// 1 16 50 0 0 1 0 0 0 1 0 0 0 1 stud.dat
  [1,16,50,0,0,1,0,0,0,1,0,0,0,1, ldraw_lib__stud(realsolid)],
// 1 16 30 0 0 1 0 0 0 1 0 0 0 1 stud.dat
  [1,16,30,0,0,1,0,0,0,1,0,0,0,1, ldraw_lib__stud(realsolid)],
// 1 16 10 0 0 1 0 0 0 1 0 0 0 1 stud.dat
  [1,16,10,0,0,1,0,0,0,1,0,0,0,1, ldraw_lib__stud(realsolid)],
// 1 16 -10 0 0 1 0 0 0 1 0 0 0 1 stud.dat
  [1,16,-10,0,0,1,0,0,0,1,0,0,0,1, ldraw_lib__stud(realsolid)],
// 1 16 -30 0 0 1 0 0 0 1 0 0 0 1 stud.dat
  [1,16,-30,0,0,1,0,0,0,1,0,0,0,1, ldraw_lib__stud(realsolid)],
// 1 16 -50 0 0 1 0 0 0 1 0 0 0 1 stud.dat
  [1,16,-50,0,0,1,0,0,0,1,0,0,0,1, ldraw_lib__stud(realsolid)],
// 0
];
module ldraw_lib__s__3009s01(step=0, col=false, unit=2/5, alt=false, line=0.2, solid=!$preview)
    makepoly(ldraw_lib__s__3009s01(solid), step=step, col=col, unit=unit, alt=alt, line=line, solid=solid);
ldraw_lib__s__3009s01(line=0.2);
// file: ../p/box5-12.scad
use <../lib.scad>
function ldraw_lib__box5_12() = [
// 0 Box with 5 Faces without Any Edges
// 0 Name: box5-12.dat
// 0 Author: Chris Dee [cwdee]
// 0 !LDRAW_ORG Primitive UPDATE 2009-02
// 0 !LICENSE Licensed under CC BY 2.0 and CC BY 4.0 : see CAreadme.txt
// 
// 0 BFC CERTIFY CCW
  [0,"BFC","CERTIFY"],
  [0,"BFC","CCW"],
// 
// 0 !HISTORY 2009-09-03 [PTadmin] Official Update 2009-02
// 
// 
// 4 16 1 1 1 1 1 -1 -1 1 -1 -1 1 1
  [4,16,1,1,1,1,1,-1,-1,1,-1,-1,1,1],
// 4 16 -1 0 1 1 0 1 1 1 1 -1 1 1
  [4,16,-1,0,1,1,0,1,1,1,1,-1,1,1],
// 4 16 -1 0 -1 -1 0 1 -1 1 1 -1 1 -1
  [4,16,-1,0,-1,-1,0,1,-1,1,1,-1,1,-1],
// 4 16 1 0 -1 -1 0 -1 -1 1 -1 1 1 -1
  [4,16,1,0,-1,-1,0,-1,-1,1,-1,1,1,-1],
// 4 16 1 0 1 1 0 -1 1 1 -1 1 1 1
  [4,16,1,0,1,1,0,-1,1,1,-1,1,1,1],
// 0
];
module ldraw_lib__box5_12(step=0, col=false, unit=2/5, alt=false, line=0.2, solid=!$preview)
    makepoly(ldraw_lib__box5_12(), step=step, col=col, unit=unit, alt=alt, line=line, solid=solid);
ldraw_lib__box5_12(line=0.2);
// file: 3009.scad
use <../lib.scad>
use <s/3009s01.scad>
function ldraw_lib__3009() = [
// 0 Brick  1 x  6
// 0 Name: 3009.dat
// 0 Author: James Jessiman
// 0 !LDRAW_ORG Part UPDATE 2003-03
// 0 !LICENSE Licensed under CC BY 4.0 : see CAreadme.txt
// 
// 0 BFC CERTIFY CCW
  [0,"BFC","CERTIFY"],
  [0,"BFC","CCW"],
// 
// 0 !HISTORY 2001-10-26 [PTadmin] Official Update 2001-01
// 0 !HISTORY 2002-05-07 {unknown} BFC Certification
// 0 !HISTORY 2002-06-11 [PTadmin] Official Update 2002-03
// 0 !HISTORY 2003-07-03 [Steffen] Subfiled for patterning
// 0 !HISTORY 2003-12-19 [PTadmin] Official Update 2003-03
// 0 !HISTORY 2007-06-06 [PTadmin] Header formatted for Contributor Agreement
// 0 !HISTORY 2008-07-01 [PTadmin] Official Update 2008-01
// 
// 
// 1 16 0 0 0 1 0 0 0 1 0 0 0 1 s\3009s01.dat
  [1,16,0,0,0,1,0,0,0,1,0,0,0,1, ldraw_lib__s__3009s01()],
// 4 16 -60 0 -10 -60 24 -10 60 24 -10 60 0 -10
  [4,16,-60,0,-10,-60,24,-10,60,24,-10,60,0,-10],
// 0
];
module ldraw_lib__3009(step=0, col=false, unit=2/5, alt=false, line=0.2, solid=!$preview)
    makepoly(ldraw_lib__3009(), step=step, col=col, unit=unit, alt=alt, line=line, solid=solid);
ldraw_lib__3009(line=0.2);
// file: 191925b.scad
use <../lib.scad>
use <../p/box5-12.scad>
use <s/191925s01.scad>
function ldraw_lib__191925b() = [
// 0 Sticker  0.8 x  2 with White "7750"
// 0 Name: 191925b.dat
// 0 Author: Steffen [Steffen]
// 0 !LDRAW_ORG Part UPDATE 2012-01
// 0 !LICENSE Licensed under CC BY 2.0 and CC BY 4.0 : see CAreadme.txt
// 
// 0 BFC CERTIFY CCW
  [0,"BFC","CERTIFY"],
  [0,"BFC","CCW"],
// 
// 0 !HISTORY 2012-03-30 [PTadmin] Official Update 2012-01
// 
// 
// 1 16 0 -0.25 0 20 0 0 0 0.25 0 0 0 -8 box5-12.dat
  [1,16,0,-0.25,0,20,0,0,0,0.25,0,0,0,-8, ldraw_lib__box5_12()],
// 1 16 0 -0.25 -4.5 0.415 0 0 0 1 0 0 0 0.415 s\191925s01.dat
  [1,16,0,-0.25,-4.5,0.415,0,0,0,1,0,0,0,0.415, ldraw_lib__s__191925s01()],
// 4 16 -20 -0.25 8 -16.6 -0.25 5.46 16.6 -0.25 5.46 20 -0.25 8
  [4,16,-20,-0.25,8,-16.6,-0.25,5.46,16.6,-0.25,5.46,20,-0.25,8],
// 4 16 -16.6 -0.25 5.46 -20 -0.25 8 -20 -0.25 -8 -16.6 -0.25 -7.82
  [4,16,-16.6,-0.25,5.46,-20,-0.25,8,-20,-0.25,-8,-16.6,-0.25,-7.82],
// 4 16 -16.6 -0.25 -7.82 -20 -0.25 -8 20 -0.25 -8 16.6 -0.25 -7.82
  [4,16,-16.6,-0.25,-7.82,-20,-0.25,-8,20,-0.25,-8,16.6,-0.25,-7.82],
// 4 16 20 -0.25 8 16.6 -0.25 5.46 16.6 -0.25 -7.82 20 -0.25 -8
  [4,16,20,-0.25,8,16.6,-0.25,5.46,16.6,-0.25,-7.82,20,-0.25,-8],
// 0
];
module ldraw_lib__191925b(step=0, col=false, unit=2/5, alt=false, line=0.2, solid=!$preview)
    makepoly(ldraw_lib__191925b(), step=step, col=col, unit=unit, alt=alt, line=line, solid=solid);
ldraw_lib__191925b(line=0.2);
// main file
use <../lib.scad>
use <191925b.scad>
use <3009.scad>
function ldraw_lib__3009d0d() = [
// 0 Brick  1 x  6 with White "7750" Right Sticker
// 0 Name: 3009d0d.dat
// 0 Author: Takeshi Takahashi [RainbowDolphin]
// 0 !LDRAW_ORG Shortcut UPDATE 2024-07
// 0 !LICENSE Licensed under CC BY 4.0 : see CAreadme.txt
// 
// 0 BFC CERTIFY CCW
  [0,"BFC","CERTIFY"],
  [0,"BFC","CCW"],
// 
// 0 !CATEGORY Sticker Shortcut
// 0 !KEYWORDS Bricklink 3009pb217R, locomotive, Set 7750, Train
// 
// 0 !HISTORY 2024-08-26 [OrionP] Official Update 2024-07
// 
// 1 16 0 0 0 1 0 0 0 1 0 0 0 1 3009.dat
  [1,16,0,0,0,1,0,0,0,1,0,0,0,1, ldraw_lib__3009()],
// 1 16 40 12 -10 1 0 0 0 0 -1 0 1 0 191925b.dat
  [1,16,40,12,-10,1,0,0,0,0,-1,0,1,0, ldraw_lib__191925b()],
];
module ldraw_lib__3009d0d(step=0, col=false, unit=2/5, alt=false, line=0.2, solid=!$preview)
    makepoly(ldraw_lib__3009d0d(), step=step, col=col, unit=unit, alt=alt, line=line, solid=solid);
ldraw_lib__3009d0d(line=0.2);
